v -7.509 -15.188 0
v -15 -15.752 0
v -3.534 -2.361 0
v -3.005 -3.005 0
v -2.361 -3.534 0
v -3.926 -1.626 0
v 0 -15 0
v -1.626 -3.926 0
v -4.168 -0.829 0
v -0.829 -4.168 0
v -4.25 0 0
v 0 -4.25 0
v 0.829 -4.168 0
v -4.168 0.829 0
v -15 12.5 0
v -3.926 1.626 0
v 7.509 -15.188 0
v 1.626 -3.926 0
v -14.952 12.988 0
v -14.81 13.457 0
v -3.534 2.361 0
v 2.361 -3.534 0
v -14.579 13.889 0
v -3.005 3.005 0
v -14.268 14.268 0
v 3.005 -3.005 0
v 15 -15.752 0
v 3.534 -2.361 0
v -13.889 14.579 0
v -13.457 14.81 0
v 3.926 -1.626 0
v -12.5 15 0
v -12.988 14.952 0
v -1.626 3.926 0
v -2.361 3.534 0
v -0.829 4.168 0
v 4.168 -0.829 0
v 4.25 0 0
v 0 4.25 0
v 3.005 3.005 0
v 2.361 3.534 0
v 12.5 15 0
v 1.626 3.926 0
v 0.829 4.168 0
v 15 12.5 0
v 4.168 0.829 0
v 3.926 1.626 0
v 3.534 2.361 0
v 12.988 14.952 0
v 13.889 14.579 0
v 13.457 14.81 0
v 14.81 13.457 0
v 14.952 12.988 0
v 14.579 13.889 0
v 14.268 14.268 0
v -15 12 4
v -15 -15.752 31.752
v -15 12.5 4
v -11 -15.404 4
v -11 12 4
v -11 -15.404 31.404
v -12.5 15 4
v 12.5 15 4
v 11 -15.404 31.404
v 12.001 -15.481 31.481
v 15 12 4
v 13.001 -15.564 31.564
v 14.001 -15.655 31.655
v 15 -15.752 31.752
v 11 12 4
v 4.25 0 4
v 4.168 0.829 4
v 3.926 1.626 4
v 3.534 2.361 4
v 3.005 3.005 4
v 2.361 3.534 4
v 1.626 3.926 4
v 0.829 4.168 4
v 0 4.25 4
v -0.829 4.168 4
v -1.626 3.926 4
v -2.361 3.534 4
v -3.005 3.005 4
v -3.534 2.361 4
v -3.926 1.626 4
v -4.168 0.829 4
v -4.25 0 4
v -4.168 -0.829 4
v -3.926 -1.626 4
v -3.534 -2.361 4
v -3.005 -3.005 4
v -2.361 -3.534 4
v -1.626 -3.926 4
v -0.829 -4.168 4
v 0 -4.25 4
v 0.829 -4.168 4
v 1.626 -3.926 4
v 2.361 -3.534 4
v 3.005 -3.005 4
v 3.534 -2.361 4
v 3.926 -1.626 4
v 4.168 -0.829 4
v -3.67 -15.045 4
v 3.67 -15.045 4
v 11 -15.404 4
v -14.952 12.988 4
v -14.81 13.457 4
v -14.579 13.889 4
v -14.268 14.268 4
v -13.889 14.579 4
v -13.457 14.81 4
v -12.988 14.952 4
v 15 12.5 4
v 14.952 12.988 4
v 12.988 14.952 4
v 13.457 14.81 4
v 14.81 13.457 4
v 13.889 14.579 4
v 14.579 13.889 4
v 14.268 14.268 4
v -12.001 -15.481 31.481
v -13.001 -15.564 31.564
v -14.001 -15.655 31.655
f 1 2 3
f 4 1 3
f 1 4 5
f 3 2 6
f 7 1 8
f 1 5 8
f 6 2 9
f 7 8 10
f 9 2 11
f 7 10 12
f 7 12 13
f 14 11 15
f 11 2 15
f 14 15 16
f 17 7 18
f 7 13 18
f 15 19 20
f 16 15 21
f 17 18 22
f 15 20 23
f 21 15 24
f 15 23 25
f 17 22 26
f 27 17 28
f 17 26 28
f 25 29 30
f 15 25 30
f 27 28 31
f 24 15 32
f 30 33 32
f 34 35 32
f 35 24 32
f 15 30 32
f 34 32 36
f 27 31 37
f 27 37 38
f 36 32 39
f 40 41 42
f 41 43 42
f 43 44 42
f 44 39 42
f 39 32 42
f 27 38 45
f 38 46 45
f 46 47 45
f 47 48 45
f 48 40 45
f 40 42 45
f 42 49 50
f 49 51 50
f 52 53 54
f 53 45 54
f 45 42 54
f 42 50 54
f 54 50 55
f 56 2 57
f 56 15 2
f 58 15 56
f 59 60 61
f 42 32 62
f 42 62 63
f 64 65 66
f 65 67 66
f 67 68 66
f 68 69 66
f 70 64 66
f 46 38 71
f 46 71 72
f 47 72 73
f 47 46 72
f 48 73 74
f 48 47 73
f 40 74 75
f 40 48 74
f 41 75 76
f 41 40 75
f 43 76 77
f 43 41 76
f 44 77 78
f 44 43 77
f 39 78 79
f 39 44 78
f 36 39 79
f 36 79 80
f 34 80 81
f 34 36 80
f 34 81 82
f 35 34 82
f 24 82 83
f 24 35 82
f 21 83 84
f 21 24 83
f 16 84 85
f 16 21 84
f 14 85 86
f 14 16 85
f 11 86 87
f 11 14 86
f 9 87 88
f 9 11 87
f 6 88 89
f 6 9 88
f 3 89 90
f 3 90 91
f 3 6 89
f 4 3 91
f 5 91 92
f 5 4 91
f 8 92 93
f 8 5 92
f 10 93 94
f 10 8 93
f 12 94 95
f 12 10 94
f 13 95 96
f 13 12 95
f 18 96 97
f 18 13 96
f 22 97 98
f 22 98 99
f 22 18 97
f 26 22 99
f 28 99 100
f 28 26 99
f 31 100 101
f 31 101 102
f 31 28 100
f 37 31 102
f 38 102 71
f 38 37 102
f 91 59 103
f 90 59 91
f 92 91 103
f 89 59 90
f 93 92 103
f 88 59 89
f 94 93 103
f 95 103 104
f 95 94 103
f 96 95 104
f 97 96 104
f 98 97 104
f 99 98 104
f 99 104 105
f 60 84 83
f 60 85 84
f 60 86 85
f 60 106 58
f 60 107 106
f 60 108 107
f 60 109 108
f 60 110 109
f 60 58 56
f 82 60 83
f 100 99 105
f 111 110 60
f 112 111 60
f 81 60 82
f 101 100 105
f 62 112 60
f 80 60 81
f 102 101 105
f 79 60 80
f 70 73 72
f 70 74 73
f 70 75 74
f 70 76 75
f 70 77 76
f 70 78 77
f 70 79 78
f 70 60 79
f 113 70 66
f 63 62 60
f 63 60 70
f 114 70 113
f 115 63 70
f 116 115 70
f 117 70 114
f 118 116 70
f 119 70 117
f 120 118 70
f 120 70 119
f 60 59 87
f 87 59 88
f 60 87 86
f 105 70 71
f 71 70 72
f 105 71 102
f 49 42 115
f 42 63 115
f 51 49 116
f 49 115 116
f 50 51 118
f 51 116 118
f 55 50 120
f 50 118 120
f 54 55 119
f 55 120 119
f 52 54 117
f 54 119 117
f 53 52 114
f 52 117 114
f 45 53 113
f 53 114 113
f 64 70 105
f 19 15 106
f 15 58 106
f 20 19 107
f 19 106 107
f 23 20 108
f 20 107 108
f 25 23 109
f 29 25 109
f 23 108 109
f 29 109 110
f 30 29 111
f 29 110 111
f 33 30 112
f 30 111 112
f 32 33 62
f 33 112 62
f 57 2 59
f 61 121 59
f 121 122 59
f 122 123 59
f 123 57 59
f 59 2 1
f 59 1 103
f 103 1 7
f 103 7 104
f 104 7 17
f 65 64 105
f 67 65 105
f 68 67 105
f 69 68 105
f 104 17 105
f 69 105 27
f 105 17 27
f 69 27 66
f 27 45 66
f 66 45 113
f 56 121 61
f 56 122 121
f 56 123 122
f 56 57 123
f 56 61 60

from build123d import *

# Parameters (mm, degrees)
ESQUISSE1_W             = 30
ESQUISSE1_H             = 33
ESQUISSE1_R             = 4.25
BOSS_EXTRU_1_DEPTH      = 4
CONG_1_R                = 2.5
BOSS_EXTRU_2_DEPTH      = 4
BOSS_EXTRU_3_DEPTH      = 4
ESQUISSE5_R             = 150
ENL_V_MAT_EXTRU_1_DEPTH = 42.291645644


with BuildPart() as part:
    # Esquisse1 → Boss.-Extru.1 (new body)
    with BuildSketch(Plane.XY):
        with Locations((0, -1.5)):
            Rectangle(ESQUISSE1_W, ESQUISSE1_H)
        Circle(ESQUISSE1_R, mode=Mode.SUBTRACT)
    extrude(amount=BOSS_EXTRU_1_DEPTH)

    # Congé1
    cong_1_edges = [part.edges().sort_by_distance(p)[0] for p in [
        (-15, 15, 2),
        (15, 15, 2),
    ]]
    fillet(cong_1_edges, radius=CONG_1_R)

    # Esquisse2 → Boss.-Extru.2 (add)
    with BuildSketch(Plane(origin=(15, 0, 0), x_dir=(0, 0, -1), z_dir=(1, 0, 0))):
        Polygon((-4, -18), (-34, -18), (-4, 12), align=None)
    extrude(amount=-BOSS_EXTRU_2_DEPTH)

    # Esquisse4 → Boss.-Extru.3 (add)
    with BuildSketch(Plane.ZY.offset(15)):
        Polygon((4, -18), (34, -18), (4, 12), align=None)
    extrude(amount=-BOSS_EXTRU_3_DEPTH)

    # Esquisse5 → Enlèv. mat.-Extru.1 (cut, through all)
    with BuildSketch(Plane(origin=(0, 0, 0), x_dir=(-1, 0, 0), z_dir=(0, 0, -1))):
        with Locations((0, -165)):
            Circle(ESQUISSE5_R)
    extrude(amount=-ENL_V_MAT_EXTRU_1_DEPTH, mode=Mode.SUBTRACT)


solid = part.part
